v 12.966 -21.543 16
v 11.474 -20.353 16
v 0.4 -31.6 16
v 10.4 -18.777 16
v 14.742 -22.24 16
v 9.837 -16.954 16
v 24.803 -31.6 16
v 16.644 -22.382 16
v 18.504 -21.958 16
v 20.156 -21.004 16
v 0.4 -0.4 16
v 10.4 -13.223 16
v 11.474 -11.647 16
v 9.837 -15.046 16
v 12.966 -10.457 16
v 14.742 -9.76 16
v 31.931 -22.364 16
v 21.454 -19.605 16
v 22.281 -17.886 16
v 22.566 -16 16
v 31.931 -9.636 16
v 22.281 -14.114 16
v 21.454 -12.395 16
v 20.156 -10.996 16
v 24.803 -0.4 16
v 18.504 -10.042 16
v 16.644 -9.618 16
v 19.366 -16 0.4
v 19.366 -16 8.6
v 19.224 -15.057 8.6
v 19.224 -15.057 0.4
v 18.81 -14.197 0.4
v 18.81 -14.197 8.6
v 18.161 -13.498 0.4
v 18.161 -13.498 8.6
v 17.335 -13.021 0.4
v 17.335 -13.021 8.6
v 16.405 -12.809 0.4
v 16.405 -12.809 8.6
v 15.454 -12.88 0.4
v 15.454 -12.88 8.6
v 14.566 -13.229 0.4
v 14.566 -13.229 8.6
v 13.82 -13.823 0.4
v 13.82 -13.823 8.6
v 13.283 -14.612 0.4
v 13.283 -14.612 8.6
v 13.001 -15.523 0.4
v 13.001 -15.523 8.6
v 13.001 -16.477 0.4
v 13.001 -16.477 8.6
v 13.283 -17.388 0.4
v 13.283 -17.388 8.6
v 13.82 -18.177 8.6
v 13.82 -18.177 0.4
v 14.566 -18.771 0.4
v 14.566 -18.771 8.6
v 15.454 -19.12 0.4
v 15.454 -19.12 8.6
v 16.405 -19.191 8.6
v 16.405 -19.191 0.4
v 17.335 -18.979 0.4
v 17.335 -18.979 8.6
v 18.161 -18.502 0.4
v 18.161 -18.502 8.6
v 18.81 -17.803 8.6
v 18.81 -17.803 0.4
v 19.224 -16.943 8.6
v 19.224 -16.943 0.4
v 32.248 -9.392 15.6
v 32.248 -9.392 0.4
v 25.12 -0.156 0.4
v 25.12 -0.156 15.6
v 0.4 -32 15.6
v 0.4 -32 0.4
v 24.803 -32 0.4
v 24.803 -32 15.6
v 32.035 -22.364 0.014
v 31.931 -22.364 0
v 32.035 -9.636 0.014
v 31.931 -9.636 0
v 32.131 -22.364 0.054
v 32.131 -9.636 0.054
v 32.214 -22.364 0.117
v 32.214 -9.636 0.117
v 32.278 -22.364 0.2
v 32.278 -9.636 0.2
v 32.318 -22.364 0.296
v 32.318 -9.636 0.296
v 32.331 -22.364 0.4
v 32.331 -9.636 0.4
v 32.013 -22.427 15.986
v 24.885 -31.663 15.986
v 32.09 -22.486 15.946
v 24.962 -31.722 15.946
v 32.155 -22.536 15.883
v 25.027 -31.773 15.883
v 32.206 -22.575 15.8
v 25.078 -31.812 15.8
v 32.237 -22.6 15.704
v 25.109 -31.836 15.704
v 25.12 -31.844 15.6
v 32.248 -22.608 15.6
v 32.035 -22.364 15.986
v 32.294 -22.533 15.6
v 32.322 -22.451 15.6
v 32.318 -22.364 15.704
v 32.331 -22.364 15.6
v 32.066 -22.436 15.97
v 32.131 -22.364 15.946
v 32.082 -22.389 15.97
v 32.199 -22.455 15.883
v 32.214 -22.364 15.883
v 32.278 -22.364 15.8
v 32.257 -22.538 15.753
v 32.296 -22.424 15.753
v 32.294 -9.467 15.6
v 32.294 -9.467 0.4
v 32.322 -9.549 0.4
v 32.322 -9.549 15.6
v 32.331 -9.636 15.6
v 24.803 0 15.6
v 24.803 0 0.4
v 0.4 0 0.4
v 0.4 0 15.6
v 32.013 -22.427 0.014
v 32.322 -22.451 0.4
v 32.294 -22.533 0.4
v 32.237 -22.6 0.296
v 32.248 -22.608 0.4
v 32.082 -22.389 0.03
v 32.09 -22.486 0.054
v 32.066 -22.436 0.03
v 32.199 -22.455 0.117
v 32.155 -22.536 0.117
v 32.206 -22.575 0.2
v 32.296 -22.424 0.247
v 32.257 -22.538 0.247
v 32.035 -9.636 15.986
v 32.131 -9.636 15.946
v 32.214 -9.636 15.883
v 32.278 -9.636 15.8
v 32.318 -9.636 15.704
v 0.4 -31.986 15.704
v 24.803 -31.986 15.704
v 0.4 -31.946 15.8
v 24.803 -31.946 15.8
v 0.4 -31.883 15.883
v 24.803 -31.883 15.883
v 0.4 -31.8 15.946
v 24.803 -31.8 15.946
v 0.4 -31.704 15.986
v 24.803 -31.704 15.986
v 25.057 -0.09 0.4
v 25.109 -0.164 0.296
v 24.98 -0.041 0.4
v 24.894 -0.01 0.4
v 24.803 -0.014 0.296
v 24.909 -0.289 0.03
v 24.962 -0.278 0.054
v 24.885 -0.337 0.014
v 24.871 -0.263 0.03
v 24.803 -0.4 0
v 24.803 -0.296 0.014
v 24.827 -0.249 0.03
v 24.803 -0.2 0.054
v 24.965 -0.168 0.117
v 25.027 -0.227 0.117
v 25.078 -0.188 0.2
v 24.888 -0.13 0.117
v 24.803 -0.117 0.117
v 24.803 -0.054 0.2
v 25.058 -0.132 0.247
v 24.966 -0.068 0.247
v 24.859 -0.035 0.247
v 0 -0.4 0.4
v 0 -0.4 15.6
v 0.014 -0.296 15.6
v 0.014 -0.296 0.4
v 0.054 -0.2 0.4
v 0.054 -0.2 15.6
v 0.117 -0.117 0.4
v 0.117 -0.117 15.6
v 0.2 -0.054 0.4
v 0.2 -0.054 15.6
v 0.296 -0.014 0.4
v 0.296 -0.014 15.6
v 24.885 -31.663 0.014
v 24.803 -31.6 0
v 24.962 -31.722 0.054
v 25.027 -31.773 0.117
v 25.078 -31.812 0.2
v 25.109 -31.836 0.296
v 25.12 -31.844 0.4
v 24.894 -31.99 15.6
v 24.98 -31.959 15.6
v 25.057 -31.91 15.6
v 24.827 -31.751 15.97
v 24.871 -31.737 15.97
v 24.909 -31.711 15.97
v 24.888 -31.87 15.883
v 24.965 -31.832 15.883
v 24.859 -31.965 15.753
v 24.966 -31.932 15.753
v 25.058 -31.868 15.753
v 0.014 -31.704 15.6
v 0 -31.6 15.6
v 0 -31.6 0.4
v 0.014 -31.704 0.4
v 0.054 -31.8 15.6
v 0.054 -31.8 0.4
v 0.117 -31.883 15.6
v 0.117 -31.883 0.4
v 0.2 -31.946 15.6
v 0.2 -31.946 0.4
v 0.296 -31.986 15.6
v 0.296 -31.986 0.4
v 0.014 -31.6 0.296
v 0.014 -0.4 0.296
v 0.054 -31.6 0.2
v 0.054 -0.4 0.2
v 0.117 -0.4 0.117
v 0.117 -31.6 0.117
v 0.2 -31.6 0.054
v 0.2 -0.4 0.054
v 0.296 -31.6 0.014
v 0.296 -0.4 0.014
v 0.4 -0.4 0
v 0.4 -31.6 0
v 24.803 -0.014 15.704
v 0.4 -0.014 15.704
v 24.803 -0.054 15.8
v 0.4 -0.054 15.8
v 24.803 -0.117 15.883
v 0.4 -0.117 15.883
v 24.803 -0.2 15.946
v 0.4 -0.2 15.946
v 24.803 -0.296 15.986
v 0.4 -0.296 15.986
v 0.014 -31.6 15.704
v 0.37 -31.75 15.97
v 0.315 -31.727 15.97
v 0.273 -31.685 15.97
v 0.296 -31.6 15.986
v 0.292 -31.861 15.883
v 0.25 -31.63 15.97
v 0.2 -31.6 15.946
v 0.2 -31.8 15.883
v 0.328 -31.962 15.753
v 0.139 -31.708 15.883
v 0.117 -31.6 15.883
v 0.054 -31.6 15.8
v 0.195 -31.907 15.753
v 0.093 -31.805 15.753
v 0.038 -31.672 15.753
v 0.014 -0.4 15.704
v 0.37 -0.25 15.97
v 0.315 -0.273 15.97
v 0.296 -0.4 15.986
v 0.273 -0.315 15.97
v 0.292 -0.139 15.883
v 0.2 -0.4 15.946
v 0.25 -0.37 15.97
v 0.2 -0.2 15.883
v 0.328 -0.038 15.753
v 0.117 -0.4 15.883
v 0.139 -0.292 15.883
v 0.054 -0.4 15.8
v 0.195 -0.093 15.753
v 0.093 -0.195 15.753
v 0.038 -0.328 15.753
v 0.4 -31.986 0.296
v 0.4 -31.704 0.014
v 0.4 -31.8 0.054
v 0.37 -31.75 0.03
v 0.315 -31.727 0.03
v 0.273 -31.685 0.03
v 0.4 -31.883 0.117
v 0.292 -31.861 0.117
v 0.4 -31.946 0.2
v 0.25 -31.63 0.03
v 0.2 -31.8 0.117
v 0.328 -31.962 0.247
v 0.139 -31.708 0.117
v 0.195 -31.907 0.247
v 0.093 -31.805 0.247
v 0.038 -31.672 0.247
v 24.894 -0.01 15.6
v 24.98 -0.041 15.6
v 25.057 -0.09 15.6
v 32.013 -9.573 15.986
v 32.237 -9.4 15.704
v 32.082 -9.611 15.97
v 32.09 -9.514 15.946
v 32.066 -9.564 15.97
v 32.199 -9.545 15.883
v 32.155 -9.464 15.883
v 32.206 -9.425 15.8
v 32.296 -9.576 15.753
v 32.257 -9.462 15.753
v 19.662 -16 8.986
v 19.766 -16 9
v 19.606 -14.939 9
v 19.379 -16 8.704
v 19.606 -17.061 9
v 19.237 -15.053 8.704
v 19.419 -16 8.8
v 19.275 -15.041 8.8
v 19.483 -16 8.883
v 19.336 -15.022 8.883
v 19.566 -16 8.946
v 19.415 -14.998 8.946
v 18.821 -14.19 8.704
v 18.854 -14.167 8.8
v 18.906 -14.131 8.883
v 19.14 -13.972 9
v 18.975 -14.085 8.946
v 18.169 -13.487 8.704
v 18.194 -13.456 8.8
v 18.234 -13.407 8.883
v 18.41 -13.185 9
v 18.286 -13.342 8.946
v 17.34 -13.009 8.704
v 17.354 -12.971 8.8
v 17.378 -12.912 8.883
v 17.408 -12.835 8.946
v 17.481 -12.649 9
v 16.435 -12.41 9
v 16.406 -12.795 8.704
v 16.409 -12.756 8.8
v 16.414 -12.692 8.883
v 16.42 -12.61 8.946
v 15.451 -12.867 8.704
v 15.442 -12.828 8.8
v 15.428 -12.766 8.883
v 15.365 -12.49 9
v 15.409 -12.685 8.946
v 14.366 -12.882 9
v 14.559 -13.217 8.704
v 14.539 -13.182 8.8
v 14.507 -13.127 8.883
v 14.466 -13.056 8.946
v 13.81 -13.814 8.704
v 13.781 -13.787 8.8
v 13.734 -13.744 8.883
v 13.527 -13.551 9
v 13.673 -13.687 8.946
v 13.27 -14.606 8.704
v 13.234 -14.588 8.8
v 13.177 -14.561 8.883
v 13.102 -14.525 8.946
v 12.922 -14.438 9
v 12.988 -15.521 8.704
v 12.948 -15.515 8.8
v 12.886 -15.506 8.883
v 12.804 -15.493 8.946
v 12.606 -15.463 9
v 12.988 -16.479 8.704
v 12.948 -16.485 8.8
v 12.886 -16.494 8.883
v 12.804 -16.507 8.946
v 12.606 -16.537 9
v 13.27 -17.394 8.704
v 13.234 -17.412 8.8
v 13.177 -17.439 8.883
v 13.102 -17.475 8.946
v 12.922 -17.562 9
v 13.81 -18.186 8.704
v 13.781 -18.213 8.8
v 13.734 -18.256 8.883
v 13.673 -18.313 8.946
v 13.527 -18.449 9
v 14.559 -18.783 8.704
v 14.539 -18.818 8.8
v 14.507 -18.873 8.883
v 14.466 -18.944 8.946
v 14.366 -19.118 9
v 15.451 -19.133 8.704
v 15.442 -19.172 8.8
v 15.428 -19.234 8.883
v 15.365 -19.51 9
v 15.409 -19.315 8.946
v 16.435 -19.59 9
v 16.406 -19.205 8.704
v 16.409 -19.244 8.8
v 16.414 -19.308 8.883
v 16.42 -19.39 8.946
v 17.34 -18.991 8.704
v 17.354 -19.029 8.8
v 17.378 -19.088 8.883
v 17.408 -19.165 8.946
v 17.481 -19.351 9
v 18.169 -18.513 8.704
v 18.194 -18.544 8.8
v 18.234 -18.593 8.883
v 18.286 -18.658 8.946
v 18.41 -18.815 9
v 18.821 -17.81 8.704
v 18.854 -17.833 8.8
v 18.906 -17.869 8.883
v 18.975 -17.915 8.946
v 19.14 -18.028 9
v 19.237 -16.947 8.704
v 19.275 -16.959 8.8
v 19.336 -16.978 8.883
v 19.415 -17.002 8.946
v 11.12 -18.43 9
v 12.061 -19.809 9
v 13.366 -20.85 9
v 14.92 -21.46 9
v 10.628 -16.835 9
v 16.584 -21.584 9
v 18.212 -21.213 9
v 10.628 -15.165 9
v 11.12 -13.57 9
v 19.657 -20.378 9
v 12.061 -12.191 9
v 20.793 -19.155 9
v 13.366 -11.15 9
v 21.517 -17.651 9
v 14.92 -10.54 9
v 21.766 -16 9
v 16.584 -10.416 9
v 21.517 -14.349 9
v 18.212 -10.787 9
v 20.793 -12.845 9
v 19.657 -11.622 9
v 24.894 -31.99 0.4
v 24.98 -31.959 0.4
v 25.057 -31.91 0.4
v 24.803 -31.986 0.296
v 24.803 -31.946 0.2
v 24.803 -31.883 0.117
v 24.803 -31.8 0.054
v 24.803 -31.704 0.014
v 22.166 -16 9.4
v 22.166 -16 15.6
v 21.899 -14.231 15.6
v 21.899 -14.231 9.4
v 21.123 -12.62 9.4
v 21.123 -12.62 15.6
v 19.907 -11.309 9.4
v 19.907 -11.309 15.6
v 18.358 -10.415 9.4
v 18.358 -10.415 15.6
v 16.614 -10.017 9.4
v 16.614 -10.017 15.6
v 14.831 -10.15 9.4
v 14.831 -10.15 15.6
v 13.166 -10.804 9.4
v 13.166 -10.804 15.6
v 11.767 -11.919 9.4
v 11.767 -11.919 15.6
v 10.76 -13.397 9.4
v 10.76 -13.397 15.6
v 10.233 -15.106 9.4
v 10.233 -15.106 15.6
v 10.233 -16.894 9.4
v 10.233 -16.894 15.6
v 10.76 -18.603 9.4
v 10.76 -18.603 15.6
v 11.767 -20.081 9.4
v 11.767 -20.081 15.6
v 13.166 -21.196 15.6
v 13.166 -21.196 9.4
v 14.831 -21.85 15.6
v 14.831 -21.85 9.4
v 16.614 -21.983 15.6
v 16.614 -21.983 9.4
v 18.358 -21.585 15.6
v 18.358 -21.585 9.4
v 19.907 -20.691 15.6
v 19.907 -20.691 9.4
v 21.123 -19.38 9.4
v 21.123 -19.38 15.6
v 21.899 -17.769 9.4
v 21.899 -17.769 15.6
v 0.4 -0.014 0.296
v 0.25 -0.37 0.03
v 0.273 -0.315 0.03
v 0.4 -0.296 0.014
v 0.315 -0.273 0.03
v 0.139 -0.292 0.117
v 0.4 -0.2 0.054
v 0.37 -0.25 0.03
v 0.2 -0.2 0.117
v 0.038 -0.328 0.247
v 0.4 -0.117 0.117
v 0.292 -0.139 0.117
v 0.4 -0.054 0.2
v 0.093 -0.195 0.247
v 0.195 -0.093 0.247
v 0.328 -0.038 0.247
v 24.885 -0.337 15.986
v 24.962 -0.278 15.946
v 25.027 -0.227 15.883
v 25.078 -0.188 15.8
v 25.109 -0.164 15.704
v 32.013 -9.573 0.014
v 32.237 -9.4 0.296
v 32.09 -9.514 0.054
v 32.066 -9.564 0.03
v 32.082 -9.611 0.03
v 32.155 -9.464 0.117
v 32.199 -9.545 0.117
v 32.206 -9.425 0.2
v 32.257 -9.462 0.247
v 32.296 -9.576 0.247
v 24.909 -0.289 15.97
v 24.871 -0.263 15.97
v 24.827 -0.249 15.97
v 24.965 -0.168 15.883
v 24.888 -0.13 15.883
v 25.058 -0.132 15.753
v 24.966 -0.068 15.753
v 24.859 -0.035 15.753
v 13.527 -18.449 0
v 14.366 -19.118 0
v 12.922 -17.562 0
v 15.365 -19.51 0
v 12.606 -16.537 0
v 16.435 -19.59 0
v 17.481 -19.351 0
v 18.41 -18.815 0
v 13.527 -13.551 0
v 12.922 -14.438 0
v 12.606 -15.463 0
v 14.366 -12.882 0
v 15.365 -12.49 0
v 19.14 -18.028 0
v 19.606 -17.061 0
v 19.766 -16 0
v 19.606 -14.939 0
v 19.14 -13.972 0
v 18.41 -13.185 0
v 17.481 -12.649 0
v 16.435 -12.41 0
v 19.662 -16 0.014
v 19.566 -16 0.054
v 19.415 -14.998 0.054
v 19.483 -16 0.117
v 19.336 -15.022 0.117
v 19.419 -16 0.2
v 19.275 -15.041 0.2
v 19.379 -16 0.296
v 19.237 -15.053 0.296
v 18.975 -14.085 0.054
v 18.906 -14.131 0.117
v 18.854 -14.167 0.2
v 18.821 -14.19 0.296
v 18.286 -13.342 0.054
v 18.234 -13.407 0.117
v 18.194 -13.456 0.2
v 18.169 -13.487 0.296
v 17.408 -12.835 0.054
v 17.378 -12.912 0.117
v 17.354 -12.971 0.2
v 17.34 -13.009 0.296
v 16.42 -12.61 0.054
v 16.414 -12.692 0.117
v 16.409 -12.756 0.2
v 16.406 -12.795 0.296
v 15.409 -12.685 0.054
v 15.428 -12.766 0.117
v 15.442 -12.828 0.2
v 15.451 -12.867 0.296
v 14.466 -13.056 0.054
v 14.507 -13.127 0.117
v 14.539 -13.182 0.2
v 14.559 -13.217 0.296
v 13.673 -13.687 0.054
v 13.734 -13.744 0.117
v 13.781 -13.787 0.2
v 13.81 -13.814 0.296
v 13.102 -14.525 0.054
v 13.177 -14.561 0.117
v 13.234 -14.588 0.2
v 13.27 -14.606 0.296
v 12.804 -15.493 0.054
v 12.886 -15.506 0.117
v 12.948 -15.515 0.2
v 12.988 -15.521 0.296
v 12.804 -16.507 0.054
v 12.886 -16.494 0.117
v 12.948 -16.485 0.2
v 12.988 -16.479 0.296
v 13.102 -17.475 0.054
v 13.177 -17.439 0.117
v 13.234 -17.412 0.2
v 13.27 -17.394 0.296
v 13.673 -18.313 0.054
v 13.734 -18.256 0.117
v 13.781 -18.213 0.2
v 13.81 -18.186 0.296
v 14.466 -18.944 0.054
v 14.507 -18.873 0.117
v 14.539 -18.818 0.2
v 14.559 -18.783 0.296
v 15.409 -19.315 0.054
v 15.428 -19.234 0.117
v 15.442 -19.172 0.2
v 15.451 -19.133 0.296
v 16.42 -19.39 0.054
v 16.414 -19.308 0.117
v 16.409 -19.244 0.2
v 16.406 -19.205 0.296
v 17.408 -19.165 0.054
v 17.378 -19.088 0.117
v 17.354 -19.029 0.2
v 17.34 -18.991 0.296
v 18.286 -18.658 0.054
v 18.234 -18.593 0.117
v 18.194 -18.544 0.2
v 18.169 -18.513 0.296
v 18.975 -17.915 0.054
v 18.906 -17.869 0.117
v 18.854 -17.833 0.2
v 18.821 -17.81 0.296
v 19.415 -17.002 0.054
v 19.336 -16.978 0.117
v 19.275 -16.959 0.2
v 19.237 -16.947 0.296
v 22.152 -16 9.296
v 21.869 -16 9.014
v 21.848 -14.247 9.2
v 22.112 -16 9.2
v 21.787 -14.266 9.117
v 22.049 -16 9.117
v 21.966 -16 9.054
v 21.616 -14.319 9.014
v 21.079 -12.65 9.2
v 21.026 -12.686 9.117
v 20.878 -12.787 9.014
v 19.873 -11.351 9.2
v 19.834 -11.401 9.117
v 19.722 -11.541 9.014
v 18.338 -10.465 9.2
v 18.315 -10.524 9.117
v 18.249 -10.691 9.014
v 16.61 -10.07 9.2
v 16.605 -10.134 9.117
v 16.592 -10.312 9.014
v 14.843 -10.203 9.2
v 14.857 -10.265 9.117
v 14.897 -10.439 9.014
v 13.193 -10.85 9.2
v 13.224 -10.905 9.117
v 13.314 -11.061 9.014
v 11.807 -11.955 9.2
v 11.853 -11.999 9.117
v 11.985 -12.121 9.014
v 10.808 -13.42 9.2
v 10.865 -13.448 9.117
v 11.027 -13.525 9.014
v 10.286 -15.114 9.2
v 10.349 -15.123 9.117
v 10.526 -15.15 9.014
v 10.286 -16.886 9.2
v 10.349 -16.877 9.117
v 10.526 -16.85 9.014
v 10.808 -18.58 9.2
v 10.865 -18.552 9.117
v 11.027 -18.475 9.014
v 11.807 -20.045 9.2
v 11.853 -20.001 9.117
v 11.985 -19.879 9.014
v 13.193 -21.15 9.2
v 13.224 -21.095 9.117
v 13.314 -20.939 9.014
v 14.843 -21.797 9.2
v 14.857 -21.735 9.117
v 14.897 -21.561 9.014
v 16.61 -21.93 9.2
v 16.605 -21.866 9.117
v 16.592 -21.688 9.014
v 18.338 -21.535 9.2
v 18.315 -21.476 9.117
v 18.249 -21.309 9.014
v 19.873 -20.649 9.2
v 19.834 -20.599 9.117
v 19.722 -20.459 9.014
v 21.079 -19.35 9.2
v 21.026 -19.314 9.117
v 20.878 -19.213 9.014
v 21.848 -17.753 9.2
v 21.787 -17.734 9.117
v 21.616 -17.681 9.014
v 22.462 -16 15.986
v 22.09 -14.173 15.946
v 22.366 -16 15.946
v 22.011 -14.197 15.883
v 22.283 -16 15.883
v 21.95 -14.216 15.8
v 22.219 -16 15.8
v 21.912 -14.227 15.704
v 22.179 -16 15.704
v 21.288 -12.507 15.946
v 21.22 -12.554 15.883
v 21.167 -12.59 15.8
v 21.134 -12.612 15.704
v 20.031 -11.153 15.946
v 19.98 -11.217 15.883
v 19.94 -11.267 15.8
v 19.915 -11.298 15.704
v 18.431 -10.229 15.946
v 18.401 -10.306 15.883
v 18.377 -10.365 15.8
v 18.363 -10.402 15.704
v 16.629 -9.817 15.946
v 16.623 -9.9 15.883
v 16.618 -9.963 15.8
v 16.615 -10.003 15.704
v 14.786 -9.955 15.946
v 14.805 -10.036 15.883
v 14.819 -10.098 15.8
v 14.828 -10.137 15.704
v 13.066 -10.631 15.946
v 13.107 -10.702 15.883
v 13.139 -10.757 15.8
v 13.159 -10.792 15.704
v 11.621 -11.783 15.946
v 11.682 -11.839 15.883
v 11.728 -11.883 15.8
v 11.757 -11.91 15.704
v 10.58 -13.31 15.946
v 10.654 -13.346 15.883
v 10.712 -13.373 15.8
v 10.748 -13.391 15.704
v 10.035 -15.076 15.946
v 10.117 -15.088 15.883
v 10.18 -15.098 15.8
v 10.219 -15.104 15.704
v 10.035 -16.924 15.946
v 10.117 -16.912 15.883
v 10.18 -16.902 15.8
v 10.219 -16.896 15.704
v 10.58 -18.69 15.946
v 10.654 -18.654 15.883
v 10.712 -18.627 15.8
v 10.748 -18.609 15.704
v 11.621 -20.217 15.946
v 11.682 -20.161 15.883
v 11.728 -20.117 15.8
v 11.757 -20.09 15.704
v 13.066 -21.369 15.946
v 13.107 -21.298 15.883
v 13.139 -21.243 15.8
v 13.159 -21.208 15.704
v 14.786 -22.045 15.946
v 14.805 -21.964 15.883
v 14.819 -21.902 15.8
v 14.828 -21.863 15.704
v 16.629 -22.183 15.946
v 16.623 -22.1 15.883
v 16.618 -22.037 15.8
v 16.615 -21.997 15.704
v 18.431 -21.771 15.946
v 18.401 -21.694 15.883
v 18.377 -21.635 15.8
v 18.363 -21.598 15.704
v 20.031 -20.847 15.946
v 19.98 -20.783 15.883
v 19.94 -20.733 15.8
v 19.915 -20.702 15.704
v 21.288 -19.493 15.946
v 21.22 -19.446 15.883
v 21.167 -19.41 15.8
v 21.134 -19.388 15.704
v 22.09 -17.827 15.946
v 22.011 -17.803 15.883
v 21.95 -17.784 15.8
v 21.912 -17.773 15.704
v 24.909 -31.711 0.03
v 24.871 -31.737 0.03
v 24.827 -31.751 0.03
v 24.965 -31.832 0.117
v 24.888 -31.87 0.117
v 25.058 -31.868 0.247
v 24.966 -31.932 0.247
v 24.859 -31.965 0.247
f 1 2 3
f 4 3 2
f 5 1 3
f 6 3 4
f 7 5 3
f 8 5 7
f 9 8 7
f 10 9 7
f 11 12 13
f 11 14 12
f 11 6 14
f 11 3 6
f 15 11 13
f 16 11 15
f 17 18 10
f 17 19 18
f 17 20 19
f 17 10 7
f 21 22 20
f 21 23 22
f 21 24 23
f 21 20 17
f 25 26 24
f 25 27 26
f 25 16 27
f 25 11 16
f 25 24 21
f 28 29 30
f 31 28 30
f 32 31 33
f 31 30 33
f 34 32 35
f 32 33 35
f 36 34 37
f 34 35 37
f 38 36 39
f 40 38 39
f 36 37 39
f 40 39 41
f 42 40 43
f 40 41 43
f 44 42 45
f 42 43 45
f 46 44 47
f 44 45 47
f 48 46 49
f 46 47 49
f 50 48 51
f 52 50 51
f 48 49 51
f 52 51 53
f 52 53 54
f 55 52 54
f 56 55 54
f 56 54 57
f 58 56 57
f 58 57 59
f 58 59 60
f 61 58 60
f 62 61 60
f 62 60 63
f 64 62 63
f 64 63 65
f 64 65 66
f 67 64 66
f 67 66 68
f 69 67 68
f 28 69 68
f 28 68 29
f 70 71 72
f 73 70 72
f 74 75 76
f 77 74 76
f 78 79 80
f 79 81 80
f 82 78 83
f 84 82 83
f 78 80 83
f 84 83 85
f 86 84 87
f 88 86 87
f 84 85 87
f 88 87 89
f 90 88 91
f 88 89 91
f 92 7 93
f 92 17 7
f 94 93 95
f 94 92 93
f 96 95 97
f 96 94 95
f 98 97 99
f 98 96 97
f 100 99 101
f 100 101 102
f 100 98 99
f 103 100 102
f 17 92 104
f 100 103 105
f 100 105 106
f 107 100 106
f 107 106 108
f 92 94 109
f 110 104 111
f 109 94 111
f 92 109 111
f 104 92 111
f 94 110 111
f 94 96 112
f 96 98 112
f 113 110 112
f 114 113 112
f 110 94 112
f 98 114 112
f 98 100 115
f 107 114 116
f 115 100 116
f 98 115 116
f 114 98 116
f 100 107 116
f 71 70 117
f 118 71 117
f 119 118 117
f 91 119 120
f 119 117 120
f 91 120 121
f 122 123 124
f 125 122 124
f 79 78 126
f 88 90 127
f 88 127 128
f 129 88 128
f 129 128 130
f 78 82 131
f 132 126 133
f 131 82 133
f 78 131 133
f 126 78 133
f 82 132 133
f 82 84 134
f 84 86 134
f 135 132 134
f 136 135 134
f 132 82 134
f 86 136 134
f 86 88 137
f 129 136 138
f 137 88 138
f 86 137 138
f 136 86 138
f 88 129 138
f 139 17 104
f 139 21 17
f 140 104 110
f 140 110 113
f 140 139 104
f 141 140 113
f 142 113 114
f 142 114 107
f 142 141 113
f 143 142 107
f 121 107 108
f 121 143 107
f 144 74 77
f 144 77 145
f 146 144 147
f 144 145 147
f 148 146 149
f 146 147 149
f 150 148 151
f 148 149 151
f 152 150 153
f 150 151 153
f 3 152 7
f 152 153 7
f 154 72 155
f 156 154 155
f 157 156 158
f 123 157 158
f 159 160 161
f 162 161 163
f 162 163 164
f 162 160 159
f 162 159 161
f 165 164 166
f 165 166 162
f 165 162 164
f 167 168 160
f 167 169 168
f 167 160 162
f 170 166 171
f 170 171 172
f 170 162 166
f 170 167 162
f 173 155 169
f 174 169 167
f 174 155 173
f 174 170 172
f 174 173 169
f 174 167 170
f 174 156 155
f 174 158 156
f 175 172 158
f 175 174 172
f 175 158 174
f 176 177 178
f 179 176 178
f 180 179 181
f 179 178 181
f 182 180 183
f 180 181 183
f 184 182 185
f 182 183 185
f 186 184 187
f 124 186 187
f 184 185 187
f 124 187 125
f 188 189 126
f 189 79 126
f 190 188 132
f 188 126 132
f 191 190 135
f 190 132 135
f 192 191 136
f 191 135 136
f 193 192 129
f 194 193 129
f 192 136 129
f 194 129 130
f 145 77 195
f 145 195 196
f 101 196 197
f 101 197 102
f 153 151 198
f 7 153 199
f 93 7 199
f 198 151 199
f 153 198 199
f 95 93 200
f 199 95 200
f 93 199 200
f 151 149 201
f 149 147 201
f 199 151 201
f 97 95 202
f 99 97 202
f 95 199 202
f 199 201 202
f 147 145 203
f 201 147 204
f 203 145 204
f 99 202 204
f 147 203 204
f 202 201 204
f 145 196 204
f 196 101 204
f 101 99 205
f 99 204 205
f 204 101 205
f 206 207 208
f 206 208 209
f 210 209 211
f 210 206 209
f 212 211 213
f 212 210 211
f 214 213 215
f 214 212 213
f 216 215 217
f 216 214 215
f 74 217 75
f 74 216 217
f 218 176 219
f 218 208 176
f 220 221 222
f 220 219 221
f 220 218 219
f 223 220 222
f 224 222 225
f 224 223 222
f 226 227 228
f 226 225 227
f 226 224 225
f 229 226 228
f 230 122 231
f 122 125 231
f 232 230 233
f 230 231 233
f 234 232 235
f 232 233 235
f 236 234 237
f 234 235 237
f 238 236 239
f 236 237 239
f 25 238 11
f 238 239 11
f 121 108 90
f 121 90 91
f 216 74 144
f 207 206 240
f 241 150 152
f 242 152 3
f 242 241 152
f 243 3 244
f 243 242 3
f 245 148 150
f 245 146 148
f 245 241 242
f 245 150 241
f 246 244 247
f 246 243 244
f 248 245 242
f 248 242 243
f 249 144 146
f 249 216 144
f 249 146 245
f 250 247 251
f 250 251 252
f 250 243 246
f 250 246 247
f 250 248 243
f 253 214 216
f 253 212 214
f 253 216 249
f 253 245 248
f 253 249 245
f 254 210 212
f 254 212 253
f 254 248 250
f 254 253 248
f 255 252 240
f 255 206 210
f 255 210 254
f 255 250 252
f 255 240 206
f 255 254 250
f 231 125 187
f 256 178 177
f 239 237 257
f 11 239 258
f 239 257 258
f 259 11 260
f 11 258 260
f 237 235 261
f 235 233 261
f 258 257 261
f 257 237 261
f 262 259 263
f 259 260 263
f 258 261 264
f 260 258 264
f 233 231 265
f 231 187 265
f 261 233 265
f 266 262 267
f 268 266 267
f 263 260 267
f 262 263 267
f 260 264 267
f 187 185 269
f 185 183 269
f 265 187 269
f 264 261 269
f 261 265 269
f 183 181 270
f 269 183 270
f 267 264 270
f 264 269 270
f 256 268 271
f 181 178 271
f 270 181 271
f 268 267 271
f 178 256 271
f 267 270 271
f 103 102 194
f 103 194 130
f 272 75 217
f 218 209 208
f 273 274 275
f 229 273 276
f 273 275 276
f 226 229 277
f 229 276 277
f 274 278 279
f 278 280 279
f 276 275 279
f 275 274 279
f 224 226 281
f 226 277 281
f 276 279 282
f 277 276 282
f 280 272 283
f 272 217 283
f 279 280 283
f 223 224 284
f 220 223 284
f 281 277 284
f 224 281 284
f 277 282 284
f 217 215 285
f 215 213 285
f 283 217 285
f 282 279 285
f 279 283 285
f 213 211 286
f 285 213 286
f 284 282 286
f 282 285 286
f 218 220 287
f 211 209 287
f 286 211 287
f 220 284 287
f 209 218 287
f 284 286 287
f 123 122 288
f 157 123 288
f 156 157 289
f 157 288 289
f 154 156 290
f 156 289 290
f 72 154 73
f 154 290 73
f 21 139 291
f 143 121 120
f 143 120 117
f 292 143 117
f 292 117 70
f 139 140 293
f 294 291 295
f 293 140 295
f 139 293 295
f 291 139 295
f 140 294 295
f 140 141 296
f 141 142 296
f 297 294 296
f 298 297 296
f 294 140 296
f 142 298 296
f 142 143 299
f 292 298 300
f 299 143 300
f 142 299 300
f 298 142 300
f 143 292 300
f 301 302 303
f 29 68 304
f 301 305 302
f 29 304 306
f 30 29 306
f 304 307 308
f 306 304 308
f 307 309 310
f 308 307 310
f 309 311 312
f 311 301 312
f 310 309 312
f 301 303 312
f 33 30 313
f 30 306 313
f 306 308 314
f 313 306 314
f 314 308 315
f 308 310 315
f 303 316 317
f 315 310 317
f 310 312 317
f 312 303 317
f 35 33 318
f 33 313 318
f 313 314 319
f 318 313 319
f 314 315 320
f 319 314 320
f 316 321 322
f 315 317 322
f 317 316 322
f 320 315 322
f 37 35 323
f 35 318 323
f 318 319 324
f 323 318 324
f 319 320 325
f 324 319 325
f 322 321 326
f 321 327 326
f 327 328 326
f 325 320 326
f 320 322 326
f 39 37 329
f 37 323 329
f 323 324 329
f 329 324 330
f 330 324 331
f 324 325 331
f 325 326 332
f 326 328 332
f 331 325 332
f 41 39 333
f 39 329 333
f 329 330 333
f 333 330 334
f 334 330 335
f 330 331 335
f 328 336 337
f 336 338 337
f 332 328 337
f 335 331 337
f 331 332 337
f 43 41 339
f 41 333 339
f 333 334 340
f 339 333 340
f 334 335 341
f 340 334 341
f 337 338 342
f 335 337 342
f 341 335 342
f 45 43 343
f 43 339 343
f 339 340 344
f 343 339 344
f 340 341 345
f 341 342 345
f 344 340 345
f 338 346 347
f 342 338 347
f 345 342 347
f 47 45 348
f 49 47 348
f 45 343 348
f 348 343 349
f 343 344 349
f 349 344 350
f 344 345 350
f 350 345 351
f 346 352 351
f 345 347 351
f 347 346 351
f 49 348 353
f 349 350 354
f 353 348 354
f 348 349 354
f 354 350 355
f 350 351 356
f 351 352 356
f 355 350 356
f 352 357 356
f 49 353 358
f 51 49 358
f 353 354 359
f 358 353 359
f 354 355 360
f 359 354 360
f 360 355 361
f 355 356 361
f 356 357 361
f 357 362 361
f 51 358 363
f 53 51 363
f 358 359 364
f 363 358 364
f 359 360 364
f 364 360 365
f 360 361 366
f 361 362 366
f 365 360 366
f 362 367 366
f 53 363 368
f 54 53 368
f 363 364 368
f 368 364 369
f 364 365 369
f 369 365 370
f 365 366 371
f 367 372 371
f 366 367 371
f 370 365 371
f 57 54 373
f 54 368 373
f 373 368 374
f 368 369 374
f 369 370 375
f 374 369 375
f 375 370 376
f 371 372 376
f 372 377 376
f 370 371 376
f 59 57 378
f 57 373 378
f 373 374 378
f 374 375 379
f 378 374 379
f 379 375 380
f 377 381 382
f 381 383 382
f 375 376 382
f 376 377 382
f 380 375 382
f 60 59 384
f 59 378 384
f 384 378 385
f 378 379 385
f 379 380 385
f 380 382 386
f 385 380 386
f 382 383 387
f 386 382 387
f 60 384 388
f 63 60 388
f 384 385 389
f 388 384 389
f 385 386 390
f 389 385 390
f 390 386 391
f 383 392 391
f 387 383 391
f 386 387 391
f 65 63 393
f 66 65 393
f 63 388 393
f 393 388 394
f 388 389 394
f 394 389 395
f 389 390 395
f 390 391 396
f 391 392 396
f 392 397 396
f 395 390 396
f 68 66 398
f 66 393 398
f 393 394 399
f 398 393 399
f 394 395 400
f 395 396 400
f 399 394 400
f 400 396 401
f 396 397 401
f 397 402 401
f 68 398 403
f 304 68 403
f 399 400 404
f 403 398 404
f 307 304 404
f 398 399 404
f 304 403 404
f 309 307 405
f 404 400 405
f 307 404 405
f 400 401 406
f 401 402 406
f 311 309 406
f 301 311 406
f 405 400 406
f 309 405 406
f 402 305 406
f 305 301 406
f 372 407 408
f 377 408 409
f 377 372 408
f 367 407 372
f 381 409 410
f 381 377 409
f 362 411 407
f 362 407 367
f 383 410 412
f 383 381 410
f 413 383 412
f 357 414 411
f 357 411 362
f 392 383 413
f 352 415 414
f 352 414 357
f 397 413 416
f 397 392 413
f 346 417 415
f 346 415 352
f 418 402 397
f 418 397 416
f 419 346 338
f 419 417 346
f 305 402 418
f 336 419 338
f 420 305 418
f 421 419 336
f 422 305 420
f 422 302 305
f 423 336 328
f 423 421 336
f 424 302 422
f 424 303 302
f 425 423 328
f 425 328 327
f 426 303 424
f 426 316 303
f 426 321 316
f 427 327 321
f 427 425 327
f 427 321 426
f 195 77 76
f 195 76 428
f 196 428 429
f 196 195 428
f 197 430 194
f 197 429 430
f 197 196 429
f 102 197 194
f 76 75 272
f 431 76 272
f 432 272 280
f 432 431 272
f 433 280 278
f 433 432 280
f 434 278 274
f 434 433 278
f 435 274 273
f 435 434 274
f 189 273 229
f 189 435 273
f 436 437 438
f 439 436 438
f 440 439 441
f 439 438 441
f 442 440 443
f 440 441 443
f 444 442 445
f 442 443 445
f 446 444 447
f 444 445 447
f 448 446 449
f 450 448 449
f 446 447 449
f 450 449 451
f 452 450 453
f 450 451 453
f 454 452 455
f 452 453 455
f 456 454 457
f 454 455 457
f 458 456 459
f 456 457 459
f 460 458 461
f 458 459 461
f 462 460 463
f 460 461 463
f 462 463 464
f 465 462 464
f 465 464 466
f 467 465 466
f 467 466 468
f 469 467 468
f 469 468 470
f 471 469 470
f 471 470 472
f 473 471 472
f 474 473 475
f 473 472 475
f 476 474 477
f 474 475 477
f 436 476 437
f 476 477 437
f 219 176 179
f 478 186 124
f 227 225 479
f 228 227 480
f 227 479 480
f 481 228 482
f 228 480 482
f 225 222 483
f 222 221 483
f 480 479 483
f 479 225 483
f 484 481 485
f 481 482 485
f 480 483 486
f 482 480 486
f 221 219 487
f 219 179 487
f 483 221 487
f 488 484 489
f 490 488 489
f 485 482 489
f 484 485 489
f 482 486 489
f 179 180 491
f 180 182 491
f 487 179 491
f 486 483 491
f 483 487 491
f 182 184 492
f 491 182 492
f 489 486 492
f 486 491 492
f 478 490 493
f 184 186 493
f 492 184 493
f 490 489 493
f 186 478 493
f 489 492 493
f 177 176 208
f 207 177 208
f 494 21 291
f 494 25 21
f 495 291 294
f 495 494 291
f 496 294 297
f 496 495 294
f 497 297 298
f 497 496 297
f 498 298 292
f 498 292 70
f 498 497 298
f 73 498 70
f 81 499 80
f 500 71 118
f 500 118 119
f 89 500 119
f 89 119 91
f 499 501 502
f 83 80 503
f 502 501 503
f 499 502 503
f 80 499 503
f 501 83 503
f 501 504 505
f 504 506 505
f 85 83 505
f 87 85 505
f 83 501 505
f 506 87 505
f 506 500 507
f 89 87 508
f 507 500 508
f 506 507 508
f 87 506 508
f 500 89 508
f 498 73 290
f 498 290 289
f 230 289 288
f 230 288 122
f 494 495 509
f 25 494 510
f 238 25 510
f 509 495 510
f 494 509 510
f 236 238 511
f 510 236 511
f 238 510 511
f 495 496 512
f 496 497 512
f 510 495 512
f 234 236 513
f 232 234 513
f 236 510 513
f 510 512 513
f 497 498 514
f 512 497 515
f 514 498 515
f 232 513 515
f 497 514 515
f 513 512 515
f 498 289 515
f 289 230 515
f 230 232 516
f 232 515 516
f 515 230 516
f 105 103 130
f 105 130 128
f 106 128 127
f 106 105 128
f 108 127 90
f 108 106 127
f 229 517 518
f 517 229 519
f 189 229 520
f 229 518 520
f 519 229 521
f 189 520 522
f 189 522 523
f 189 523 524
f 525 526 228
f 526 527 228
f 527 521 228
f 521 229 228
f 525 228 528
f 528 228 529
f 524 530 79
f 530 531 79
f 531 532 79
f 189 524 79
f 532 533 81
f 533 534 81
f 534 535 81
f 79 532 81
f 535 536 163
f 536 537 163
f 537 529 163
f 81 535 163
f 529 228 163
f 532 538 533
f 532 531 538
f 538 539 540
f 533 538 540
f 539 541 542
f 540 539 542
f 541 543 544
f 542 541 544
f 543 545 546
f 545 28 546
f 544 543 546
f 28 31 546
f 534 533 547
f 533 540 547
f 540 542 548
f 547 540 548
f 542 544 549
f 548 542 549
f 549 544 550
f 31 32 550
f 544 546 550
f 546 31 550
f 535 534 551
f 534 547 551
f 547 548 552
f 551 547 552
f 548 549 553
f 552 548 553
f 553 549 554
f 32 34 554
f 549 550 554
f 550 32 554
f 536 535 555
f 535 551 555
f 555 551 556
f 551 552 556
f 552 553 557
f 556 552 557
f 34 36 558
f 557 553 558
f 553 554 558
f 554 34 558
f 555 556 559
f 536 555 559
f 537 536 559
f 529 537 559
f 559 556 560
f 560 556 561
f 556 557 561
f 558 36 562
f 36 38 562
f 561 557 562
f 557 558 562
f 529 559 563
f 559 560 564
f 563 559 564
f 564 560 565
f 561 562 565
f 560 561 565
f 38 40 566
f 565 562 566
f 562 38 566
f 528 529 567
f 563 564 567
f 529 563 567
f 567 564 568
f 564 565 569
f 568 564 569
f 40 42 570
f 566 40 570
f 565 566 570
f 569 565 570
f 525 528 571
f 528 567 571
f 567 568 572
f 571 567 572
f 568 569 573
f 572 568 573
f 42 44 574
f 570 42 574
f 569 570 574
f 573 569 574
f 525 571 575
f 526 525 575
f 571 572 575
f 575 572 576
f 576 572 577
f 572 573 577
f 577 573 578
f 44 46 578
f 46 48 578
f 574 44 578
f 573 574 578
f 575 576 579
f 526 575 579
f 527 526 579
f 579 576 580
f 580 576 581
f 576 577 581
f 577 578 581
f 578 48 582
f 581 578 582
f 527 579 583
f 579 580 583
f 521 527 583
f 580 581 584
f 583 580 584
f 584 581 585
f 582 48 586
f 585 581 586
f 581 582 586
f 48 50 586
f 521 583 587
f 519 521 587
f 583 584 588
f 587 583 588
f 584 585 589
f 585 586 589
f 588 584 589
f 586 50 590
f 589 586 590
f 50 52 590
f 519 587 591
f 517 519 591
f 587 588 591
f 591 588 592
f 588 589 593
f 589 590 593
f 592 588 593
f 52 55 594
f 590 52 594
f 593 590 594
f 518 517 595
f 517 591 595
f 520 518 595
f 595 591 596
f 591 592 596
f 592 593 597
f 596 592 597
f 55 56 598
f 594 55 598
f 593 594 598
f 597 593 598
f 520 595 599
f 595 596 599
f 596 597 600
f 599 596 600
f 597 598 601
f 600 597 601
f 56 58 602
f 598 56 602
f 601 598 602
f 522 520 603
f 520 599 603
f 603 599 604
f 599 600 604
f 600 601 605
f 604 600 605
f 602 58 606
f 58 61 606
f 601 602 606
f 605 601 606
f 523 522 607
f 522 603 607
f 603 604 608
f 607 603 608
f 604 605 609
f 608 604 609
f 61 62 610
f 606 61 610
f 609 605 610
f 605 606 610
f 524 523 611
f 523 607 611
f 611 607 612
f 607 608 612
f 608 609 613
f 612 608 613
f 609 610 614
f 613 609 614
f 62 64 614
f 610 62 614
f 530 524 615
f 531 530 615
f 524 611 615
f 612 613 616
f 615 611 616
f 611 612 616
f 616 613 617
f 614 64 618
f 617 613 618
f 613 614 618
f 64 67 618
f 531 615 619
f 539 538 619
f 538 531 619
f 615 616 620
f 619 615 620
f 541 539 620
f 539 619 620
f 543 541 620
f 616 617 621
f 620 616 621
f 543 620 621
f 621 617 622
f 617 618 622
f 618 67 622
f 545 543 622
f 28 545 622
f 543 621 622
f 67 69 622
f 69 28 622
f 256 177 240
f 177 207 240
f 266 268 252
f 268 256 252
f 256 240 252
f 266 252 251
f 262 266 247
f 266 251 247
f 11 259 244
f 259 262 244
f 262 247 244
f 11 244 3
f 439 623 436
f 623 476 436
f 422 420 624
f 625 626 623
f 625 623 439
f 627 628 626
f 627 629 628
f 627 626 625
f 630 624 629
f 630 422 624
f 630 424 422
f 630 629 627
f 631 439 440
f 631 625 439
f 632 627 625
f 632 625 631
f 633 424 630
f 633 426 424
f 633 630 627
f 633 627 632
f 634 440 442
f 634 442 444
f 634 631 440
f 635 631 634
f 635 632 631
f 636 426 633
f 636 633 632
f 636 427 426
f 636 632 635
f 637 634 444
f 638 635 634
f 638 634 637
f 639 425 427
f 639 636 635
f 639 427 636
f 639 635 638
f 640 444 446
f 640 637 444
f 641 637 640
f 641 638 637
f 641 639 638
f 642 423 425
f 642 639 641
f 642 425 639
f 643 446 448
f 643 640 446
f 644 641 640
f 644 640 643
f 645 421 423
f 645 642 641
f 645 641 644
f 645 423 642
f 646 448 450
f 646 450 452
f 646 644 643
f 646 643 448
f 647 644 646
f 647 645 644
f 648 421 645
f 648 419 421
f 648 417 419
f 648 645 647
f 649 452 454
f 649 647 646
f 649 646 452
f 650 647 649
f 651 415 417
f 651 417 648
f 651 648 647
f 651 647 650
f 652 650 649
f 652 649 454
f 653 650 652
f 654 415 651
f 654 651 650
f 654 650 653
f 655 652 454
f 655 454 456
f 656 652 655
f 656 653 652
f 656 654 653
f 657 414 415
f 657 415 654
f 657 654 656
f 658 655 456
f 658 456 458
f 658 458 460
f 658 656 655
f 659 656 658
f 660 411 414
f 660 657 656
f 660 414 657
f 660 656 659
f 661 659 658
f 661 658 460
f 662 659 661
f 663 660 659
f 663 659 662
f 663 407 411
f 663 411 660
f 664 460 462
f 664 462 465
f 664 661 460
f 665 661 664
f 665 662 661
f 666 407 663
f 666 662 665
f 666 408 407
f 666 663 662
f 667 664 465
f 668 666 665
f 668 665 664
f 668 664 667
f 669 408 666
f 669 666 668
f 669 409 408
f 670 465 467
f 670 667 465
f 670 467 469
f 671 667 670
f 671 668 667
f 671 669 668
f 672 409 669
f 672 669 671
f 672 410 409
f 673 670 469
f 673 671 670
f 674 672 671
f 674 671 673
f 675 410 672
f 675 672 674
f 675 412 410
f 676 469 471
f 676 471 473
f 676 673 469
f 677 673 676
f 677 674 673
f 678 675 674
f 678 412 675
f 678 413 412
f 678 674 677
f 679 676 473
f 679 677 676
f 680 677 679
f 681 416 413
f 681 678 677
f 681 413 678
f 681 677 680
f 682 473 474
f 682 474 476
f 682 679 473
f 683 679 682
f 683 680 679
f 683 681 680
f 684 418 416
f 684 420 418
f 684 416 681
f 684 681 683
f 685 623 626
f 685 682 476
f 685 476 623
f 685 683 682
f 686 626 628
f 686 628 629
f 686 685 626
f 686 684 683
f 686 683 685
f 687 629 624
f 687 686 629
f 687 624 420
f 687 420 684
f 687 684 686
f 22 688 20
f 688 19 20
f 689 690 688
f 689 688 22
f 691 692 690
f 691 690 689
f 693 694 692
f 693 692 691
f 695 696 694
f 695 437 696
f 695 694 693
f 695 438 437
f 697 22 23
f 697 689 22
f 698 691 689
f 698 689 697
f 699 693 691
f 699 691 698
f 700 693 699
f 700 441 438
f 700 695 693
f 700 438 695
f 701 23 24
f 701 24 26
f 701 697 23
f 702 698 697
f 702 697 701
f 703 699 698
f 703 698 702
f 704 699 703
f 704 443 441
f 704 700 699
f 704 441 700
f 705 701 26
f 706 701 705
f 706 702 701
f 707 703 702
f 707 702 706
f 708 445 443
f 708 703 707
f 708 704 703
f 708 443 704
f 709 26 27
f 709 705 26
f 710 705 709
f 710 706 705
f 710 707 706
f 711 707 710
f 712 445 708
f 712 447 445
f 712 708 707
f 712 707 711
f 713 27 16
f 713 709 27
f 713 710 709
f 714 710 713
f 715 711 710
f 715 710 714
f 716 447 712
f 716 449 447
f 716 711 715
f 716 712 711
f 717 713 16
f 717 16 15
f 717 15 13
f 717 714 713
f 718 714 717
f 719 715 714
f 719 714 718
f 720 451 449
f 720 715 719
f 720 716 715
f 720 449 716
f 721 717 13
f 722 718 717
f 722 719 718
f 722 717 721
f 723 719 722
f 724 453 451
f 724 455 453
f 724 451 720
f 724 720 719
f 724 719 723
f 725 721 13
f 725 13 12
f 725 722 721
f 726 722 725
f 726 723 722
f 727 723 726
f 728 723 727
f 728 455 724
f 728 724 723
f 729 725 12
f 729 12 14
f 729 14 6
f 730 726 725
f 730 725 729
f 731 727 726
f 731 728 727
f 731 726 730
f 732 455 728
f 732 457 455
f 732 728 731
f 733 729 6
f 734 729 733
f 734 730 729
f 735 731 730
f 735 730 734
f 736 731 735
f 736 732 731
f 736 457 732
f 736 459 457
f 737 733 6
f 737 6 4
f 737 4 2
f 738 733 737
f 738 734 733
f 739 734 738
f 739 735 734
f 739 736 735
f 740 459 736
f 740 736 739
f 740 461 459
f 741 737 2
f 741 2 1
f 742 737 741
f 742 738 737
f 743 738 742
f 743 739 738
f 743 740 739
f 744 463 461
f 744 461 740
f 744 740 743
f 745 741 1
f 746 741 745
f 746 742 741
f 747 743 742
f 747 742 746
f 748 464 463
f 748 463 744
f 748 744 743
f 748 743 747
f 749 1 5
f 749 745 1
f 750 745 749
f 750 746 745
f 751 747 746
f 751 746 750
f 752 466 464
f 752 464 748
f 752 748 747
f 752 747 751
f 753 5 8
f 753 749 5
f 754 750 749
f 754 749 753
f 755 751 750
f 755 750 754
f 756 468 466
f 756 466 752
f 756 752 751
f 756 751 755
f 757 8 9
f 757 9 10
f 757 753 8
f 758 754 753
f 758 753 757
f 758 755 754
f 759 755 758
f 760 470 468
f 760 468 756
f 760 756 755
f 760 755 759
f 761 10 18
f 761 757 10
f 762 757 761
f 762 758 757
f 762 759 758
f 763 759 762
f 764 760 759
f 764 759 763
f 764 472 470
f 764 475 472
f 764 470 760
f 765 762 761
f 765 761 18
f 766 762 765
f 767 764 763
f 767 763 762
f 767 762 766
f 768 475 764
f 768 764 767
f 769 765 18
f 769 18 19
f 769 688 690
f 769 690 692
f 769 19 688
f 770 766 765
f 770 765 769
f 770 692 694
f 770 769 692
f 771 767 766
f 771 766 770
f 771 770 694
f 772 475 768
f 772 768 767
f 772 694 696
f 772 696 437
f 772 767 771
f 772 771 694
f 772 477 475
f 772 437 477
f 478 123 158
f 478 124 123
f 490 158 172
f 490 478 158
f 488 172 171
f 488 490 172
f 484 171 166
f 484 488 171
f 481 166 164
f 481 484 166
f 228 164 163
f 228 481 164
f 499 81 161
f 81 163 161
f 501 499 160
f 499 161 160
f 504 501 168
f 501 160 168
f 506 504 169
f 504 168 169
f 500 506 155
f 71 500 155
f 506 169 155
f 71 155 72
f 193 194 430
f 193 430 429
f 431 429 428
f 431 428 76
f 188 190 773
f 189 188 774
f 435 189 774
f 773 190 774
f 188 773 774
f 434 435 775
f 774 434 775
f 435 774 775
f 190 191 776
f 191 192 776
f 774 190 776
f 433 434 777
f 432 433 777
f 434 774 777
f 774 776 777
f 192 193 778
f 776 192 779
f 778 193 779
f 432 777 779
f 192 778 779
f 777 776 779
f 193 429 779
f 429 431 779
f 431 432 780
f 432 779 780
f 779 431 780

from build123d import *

# Parameters (mm, degrees)
BOSS_EXTRUDE1_DEPTH = 16
SKETCH4_R           = 6
CUT_EXTRUDE1_DEPTH  = 7
SKETCH5_R           = 3.2
CUT_EXTRUDE2_DEPTH  = 11
FILLET1_R           = 0.4


with BuildPart() as part:
    # Sketch3 → Boss-Extrude1 (new body)
    with BuildSketch(Plane.XY):
        Polygon((0, 0), (0, -32), (25, -32), (32.331439149, -22.5), (32.331439149, -9.5), (25, 0), align=None)
    extrude(amount=BOSS_EXTRUDE1_DEPTH)

    # Sketch4 → Cut-Extrude1 (cut)
    with BuildSketch(Plane.XY.offset(16)):
        with Locations((16.165719575, -16)):
            Circle(SKETCH4_R)
    extrude(amount=-CUT_EXTRUDE1_DEPTH, mode=Mode.SUBTRACT)

    # Sketch5 → Cut-Extrude2 (cut)
    with BuildSketch(Plane.XY.offset(9)):
        with Locations((16.165719575, -16)):
            Circle(SKETCH5_R)
    extrude(amount=-CUT_EXTRUDE2_DEPTH, mode=Mode.SUBTRACT)

    # Fillet1
    fillet1_edges = [part.edges().sort_by_distance(p)[0] for p in [
        (25, 0, 8),
        (32.331439149, -9.5, 8),
        (32.331439149, -22.5, 8),
        (25, -32, 8),
        (0, -32, 8),
        (0, 0, 8),
        (12.5, -32, 16),
        (28.665719575, -27.25, 16),
        (10.165719575, -16, 9),
        (10.165719575, -16, 16),
        (32.331439149, -16, 16),
        (28.665719575, -4.75, 16),
        (12.965719575, -16, 0),
        (12.965719575, -16, 9),
        (12.5, 0, 16),
        (28.665719575, -4.75, 0),
        (32.331439149, -16, 0),
        (28.665719575, -27.25, 0),
        (12.5, -32, 0),
        (0, -16, 0),
        (12.5, 0, 0),
        (0, -16, 16),
    ]]
    fillet(fillet1_edges, radius=FILLET1_R)


solid = part.part
